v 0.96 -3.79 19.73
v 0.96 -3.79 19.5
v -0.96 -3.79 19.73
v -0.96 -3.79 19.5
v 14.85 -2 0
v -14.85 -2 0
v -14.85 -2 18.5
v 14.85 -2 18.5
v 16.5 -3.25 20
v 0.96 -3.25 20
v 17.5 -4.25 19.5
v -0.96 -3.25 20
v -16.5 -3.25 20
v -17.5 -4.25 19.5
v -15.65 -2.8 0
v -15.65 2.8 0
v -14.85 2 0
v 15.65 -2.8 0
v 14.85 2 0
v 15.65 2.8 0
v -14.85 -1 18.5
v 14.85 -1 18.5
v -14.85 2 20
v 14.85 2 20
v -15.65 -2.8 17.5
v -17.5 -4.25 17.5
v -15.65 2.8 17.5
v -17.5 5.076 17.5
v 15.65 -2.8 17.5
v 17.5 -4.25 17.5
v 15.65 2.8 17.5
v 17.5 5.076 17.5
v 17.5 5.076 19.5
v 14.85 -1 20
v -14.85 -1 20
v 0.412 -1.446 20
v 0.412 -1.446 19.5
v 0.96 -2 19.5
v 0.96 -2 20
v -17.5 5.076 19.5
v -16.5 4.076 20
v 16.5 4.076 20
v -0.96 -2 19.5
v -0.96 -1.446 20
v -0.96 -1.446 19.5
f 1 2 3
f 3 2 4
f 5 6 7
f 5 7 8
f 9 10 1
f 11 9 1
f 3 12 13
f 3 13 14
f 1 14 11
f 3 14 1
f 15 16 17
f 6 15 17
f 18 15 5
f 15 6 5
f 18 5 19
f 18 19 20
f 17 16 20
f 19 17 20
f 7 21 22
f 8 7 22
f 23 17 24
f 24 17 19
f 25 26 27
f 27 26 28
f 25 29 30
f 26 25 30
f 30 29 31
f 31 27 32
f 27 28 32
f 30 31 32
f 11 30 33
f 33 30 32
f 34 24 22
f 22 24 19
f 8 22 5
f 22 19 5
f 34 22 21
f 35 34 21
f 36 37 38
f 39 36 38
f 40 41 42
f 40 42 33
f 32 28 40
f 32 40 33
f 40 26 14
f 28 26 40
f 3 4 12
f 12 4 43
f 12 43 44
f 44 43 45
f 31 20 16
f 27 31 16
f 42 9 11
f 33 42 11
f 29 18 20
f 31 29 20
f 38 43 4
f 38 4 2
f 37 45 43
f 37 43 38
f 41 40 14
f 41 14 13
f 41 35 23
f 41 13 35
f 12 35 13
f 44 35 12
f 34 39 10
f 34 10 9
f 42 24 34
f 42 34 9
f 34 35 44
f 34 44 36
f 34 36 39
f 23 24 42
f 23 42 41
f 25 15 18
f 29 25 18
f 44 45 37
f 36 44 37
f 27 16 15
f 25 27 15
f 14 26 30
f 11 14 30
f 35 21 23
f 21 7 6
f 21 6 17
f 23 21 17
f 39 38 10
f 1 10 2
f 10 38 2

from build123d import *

# Parameters (mm, degrees)
F1_DEPTH    = 20
F2_START    = 18.5
F2_DEPTH    = 1.5
F3_START    = 17.5
F0_W        = 1.9191285201
F0_H        = 0.8
F3_DEPTH    = 2
F4_START    = 17.5
F0_H_2      = 0.9897637812
F4_DEPTH    = 2
F5_DEPTH    = 17.5
F6_DEPTH    = 18.5
F7_START    = 17.5
F0_W_2      = 35
F0_H_3      = 9.3263725303
F7_DEPTH    = 2.5
F8_T1_DEPTH = 40.1796577476
F8_T3_DEPTH = 14.5060302779


# Not quite as in the source:
# - a fillet or chamfer that OpenCascade refuses, or shapes differently, is made with other operations: its cross-section is extruded or revolved along the edge and cut away or added


with BuildPart() as f1:
    # F0 (on Top) → F1 (new body)
    with BuildSketch(Plane.XY):
        Polygon((-14.85, 2), (14.85, 2), (14.85, -1), (14.85, -2), (0.95956426, -2), (0.95956426, -2.8), (15.65, -2.8), (15.65, 2.8), (-15.65, 2.8), (-15.65, -2.8), (-0.95956426, -2.8), (-0.95956426, -2), (-14.85, -2), (-14.85, -1), align=None)
    extrude(amount=F1_DEPTH)

    # F0 (on Top) → F2 (join)
    with BuildSketch(Plane.XY.offset(F2_START)):
        Polygon((14.85, -2), (14.85, -1), (-14.85, -1), (-14.85, -2), (-0.95956426, -2), (-0.95956426, -1.4462094987), (0.4121778399, -1.4462094987), (0.95956426, -2), align=None)
    extrude(amount=F2_DEPTH)

    # F0 (on Top) → F3 (join)
    with BuildSketch(Plane.XY.offset(F3_START)):
        with Locations((0, -2.4)):
            Rectangle(F0_W, F0_H)
        Polygon((-0.95956426, -2), (0.95956426, -2), (0.4121778399, -1.4462094987), (-0.95956426, -1.4462094987), align=None)
    extrude(amount=F3_DEPTH)

    # F0 (on Top) → F4 (join)
    with BuildSketch(Plane.XY.offset(F4_START)):
        with Locations((0, -3.2948818906)):
            Rectangle(F0_W, F0_H_2)
    extrude(amount=F4_DEPTH)

    # F0 (on Top) → F5 (join)
    with BuildSketch(Plane.XY):
        with Locations((0, -2.4)):
            Rectangle(F0_W, F0_H)
    extrude(amount=F5_DEPTH)

    # F0 (on Top) → F6 (cut)
    with BuildSketch(Plane.XY):
        Polygon((-0.95956426, -2), (0.95956426, -2), (0.4121778399, -1.4462094987), (-0.95956426, -1.4462094987), align=None)
    extrude(amount=F6_DEPTH, mode=Mode.SUBTRACT)

    # F0 (on Top) → F7 (join)
    with BuildSketch(Plane.XY.offset(F7_START)):
        with Locations((0, 0.4131862652)):
            Rectangle(F0_W_2, F0_H_3)
        Polygon((15.65, -2.8), (0.95956426, -2.8), (0.95956426, -3.7897637812), (-0.95956426, -3.7897637812), (-0.95956426, -2.8), (-15.65, -2.8), (-15.65, 2.8), (15.65, 2.8), align=None, mode=Mode.SUBTRACT)
    extrude(amount=F7_DEPTH)

    # F8: chamfer of 0.5 x 1 on 4 edges, made by hand

    # F8_s2 → F8_t1 (cut)
    with BuildSketch(Plane.YZ.offset(-20.0898288738)):
        Polygon((4.0763725303, 20), (5.0763725303, 19.5), (5.0763725303, 20), align=None)
        Polygon((-3.25, 20), (-4.25, 19.5), (-4.25, 20), align=None)
    extrude(amount=F8_T1_DEPTH, mode=Mode.SUBTRACT)

    # F8_s4 → F8_t3 (cut)
    with BuildSketch(Plane.XZ.offset(-7.6662014041)):
        Polygon((-17.5, 19.5), (-16.5, 20), (-17.5, 20), align=None)
        Polygon((16.5, 20), (17.5, 19.5), (17.5, 20), align=None)
    extrude(amount=F8_T3_DEPTH, mode=Mode.SUBTRACT)


solid = f1.part
